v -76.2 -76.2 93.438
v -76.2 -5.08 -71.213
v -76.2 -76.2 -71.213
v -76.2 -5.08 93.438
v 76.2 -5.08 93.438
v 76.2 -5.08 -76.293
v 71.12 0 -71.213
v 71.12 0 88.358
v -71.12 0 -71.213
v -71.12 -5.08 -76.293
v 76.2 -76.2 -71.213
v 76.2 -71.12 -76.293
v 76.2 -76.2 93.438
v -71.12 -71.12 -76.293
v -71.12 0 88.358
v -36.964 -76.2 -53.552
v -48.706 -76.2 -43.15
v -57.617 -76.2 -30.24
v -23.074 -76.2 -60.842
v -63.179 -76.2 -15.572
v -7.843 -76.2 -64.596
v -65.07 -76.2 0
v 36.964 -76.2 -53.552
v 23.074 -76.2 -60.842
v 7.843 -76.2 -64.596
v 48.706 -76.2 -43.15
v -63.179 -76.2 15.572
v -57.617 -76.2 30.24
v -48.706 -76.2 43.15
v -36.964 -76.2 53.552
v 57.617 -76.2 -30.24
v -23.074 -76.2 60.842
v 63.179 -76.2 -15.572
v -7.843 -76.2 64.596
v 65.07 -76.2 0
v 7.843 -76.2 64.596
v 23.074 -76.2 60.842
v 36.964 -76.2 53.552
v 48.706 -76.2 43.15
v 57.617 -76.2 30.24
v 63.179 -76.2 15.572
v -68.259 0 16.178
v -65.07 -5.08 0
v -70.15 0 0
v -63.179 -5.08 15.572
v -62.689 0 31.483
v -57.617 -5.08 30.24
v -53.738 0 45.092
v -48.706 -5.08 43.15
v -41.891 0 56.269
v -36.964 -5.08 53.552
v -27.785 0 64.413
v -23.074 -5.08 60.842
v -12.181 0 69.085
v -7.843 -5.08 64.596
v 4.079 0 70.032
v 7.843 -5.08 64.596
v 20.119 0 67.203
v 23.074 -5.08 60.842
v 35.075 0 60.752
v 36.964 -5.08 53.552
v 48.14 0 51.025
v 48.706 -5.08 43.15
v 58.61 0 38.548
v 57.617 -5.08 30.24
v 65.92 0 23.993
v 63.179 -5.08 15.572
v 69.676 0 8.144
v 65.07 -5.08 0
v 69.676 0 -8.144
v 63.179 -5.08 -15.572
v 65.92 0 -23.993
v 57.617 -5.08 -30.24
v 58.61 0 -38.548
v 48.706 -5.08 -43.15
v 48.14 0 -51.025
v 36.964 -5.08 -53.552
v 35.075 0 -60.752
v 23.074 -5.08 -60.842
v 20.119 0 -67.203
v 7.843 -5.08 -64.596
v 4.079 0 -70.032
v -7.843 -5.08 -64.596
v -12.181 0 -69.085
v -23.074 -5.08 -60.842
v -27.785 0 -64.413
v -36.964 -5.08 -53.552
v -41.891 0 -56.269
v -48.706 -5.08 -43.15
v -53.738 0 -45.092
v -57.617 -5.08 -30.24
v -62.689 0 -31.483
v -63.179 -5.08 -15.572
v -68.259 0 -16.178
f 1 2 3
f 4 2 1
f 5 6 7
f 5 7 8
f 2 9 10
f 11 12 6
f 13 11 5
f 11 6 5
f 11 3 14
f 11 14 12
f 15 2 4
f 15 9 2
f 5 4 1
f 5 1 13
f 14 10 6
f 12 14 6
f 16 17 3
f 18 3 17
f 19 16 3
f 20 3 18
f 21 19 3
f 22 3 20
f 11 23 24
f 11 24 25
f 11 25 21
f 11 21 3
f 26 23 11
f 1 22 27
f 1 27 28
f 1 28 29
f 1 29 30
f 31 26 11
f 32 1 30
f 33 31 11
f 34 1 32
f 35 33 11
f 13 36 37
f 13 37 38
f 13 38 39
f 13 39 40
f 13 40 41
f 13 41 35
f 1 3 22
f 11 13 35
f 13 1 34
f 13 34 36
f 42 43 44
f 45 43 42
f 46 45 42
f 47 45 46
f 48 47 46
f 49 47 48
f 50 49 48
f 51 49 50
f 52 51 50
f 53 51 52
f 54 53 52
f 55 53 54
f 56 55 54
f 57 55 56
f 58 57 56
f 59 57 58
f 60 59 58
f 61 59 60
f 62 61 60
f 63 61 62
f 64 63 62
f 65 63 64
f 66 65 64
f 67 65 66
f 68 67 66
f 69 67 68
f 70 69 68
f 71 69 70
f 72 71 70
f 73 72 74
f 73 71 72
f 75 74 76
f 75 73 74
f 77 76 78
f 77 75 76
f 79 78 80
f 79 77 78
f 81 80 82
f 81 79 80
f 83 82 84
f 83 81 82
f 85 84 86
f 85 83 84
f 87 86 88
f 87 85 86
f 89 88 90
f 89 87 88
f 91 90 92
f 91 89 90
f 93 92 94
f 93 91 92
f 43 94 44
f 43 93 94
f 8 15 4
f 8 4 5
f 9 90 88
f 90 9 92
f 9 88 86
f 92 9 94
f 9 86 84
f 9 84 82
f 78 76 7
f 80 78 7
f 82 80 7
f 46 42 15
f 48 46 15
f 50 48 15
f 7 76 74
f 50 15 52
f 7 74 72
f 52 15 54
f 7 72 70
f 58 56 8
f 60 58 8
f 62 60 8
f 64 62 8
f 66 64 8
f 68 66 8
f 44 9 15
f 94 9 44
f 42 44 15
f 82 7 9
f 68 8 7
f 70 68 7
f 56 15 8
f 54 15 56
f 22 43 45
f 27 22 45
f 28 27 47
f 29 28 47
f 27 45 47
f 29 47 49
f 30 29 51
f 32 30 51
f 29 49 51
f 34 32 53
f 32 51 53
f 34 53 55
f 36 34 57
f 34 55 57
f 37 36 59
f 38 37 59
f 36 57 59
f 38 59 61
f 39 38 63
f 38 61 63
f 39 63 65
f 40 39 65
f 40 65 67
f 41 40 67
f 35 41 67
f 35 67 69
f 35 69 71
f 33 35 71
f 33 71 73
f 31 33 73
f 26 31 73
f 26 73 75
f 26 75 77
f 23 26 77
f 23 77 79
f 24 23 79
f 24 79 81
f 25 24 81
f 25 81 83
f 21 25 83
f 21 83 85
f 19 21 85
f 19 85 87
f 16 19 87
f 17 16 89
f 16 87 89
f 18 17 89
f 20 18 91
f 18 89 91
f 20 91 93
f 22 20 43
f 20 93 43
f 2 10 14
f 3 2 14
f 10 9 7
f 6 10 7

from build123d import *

# Parameters (mm, degrees)
F0_W     = 152.4
F0_H     = 169.731778
F1_DEPTH = 76.2
F2_R     = 65.070277
F3_DEPTH = 76.201
F4_SIZE  = 5.08


with BuildPart() as f1:
    # F0 (on Front) → F1 (new body)
    with BuildSketch(Plane.XZ):
        with Locations((0, 8.5725)):
            Rectangle(F0_W, F0_H)
    extrude(amount=F1_DEPTH)

    # F2 (on face) → F3 (cut, through all)
    with BuildSketch(Plane(origin=(0, 0, 0), x_dir=(-1, 0, 0), z_dir=(0, 1, 0))):
        Circle(F2_R)
    extrude(amount=-F3_DEPTH, mode=Mode.SUBTRACT)

    # F4
    f4_edges = [f1.edges().sort_by_distance(p)[0] for p in [
        (-76.2, 0, 8.5725),
        (0, 0, 93.438389),
        (76.2, 0, 8.5725),
        (0, 0, -76.293389),
        (65.070277, 0, 0),
        (0, -76.2, -76.293389),
        (-76.2, -38.1, -76.293389),
    ]]
    chamfer(f4_edges, length=F4_SIZE)


solid = f1.part
